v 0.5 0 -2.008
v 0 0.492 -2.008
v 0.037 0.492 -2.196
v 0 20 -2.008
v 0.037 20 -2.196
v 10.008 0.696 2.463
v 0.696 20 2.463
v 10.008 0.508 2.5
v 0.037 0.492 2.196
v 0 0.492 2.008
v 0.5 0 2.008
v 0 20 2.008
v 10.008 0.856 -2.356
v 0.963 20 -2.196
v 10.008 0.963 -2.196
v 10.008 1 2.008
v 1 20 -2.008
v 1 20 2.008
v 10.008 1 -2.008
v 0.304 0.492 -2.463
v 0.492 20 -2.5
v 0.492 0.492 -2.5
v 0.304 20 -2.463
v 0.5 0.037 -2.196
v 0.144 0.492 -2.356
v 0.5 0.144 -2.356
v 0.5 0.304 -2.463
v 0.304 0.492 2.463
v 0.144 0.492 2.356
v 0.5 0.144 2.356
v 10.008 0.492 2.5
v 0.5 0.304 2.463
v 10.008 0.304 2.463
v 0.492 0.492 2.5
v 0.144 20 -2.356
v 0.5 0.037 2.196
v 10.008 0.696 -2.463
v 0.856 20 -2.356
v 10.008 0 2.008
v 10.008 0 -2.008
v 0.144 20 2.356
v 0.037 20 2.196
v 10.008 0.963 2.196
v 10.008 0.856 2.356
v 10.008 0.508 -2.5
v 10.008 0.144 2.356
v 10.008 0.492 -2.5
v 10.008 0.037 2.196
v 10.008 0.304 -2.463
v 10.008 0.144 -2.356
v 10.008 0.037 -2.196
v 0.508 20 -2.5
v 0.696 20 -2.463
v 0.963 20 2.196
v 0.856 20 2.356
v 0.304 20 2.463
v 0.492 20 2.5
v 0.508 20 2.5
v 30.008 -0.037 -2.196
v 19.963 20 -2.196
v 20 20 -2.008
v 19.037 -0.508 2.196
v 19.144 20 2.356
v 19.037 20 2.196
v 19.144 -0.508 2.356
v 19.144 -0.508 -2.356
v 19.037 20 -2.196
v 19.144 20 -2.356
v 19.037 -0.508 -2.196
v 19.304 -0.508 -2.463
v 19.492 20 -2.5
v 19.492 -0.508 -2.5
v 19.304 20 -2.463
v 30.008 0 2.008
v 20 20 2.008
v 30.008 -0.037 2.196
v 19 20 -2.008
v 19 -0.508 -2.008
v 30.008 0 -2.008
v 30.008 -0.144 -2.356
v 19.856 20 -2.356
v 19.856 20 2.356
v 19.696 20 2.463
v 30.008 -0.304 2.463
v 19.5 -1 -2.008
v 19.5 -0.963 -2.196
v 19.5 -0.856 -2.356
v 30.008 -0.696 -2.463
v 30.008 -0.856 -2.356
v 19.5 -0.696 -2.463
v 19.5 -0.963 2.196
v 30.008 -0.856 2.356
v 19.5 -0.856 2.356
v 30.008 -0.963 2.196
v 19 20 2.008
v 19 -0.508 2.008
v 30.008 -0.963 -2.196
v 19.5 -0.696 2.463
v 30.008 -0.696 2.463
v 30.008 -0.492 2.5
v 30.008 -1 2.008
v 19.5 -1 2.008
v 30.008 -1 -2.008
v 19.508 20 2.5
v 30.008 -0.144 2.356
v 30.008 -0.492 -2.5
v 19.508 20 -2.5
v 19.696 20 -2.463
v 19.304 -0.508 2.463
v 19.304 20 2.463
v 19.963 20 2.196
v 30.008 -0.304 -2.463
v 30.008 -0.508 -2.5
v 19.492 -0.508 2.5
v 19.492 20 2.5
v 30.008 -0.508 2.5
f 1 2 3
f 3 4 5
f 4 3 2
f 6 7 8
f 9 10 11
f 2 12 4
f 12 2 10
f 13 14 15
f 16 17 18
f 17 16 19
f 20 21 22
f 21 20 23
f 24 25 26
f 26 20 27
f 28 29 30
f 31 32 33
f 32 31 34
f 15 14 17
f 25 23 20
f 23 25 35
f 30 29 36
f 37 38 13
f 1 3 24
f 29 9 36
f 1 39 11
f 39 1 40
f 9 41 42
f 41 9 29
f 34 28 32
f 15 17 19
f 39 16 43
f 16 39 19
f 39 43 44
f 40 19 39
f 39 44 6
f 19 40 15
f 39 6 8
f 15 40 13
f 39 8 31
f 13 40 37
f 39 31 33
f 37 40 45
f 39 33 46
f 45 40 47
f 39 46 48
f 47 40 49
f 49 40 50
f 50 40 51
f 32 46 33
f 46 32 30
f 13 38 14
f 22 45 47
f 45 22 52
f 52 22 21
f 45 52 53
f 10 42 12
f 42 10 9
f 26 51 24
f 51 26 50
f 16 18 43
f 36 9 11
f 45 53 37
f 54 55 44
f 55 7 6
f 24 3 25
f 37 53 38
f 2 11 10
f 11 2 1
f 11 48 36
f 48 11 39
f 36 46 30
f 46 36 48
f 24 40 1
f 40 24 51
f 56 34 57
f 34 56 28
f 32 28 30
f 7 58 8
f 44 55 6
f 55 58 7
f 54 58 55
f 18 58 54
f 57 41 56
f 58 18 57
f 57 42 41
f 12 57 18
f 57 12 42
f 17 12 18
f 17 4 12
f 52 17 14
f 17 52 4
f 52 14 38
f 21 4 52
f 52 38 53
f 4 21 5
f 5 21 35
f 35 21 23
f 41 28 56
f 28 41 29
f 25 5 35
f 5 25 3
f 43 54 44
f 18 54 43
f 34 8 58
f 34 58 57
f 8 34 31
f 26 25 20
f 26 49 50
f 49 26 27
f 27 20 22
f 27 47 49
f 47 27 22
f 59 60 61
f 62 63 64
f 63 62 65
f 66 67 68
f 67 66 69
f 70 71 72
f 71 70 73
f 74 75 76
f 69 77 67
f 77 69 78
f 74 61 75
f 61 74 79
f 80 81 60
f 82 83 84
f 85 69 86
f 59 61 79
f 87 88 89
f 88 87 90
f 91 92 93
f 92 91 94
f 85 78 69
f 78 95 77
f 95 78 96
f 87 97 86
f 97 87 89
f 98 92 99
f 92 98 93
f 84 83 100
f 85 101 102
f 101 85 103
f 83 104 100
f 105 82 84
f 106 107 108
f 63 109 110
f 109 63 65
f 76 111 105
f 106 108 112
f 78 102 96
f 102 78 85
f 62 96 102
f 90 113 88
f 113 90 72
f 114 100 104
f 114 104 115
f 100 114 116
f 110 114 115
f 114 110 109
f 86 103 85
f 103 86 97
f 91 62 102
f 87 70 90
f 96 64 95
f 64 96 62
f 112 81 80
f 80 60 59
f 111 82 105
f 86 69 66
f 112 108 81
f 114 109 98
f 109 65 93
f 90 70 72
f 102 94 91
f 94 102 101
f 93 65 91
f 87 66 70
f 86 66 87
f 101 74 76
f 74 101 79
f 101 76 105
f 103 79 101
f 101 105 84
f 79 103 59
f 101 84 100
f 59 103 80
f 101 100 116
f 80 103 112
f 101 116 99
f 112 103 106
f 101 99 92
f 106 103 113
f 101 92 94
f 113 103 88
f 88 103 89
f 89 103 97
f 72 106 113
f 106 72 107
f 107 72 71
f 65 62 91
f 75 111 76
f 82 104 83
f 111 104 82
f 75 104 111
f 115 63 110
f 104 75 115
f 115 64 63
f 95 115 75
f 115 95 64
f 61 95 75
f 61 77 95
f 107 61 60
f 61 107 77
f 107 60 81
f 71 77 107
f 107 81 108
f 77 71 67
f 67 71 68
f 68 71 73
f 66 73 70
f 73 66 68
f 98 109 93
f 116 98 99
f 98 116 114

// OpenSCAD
// file: ../utils/core/clip.scad
//
// NopSCADlib Copyright Chris Palmer 2018
// nop.head@gmail.com
// hydraraptor.blogspot.com
//
// This file is part of NopSCADlib.
//
// NopSCADlib is free software: you can redistribute it and/or modify it under the terms of the
// GNU General Public License as published by the Free Software Foundation, either version 3 of
// the License, or (at your option) any later version.
//
// NopSCADlib is distributed in the hope that it will be useful, but WITHOUT ANY WARRANTY;
// without even the implied warranty of MERCHANTABILITY or FITNESS FOR A PARTICULAR PURPOSE.
// See the GNU General Public License for more details.
//
// You should have received a copy of the GNU General Public License along with NopSCADlib.
// If not, see <https://www.gnu.org/licenses/>.
//

//
//! Construct arbitrarily large box to partition 3D space and clip objects, useful for creating cross sections to see the inside when debugging.
//!
//! Original version by Doug Moen on the OpenSCAD forum
//
//
module box(xmin, ymin, zmin, xmax, ymax, zmax) //! Construct a box given its bounds
    polyhedron(
        [[xmin, ymin, zmin],  // 0
         [xmin, ymin, zmax],  // 1
         [xmin, ymax, zmin],  // 2
         [xmin, ymax, zmax],  // 3
         [xmax, ymin, zmin],  // 4
         [xmax, ymin, zmax],  // 5
         [xmax, ymax, zmin],  // 6
         [xmax, ymax, zmax]], // 7
        [[7,5,1,3],  // top
         [2,0,4,6],  // bottom
         [5,4,0,1],  // front
         [3,2,6,7],  // back
         [5,7,6,4],  // right
         [0,2,3,1]]  // left
    );

module clip(xmin = -inf, ymin = -inf, zmin = -inf, xmax = inf, ymax = inf, zmax = inf) //! Clip child to specified boundaries
    render() intersection() {
        children();

        box(xmin, ymin, zmin, xmax, ymax, zmax);
    }
// file: ../utils/core/teardrops.scad
//
// NopSCADlib Copyright Chris Palmer 2018
// nop.head@gmail.com
// hydraraptor.blogspot.com
//
// This file is part of NopSCADlib.
//
// NopSCADlib is free software: you can redistribute it and/or modify it under the terms of the
// GNU General Public License as published by the Free Software Foundation, either version 3 of
// the License, or (at your option) any later version.
//
// NopSCADlib is distributed in the hope that it will be useful, but WITHOUT ANY WARRANTY;
// without even the implied warranty of MERCHANTABILITY or FITNESS FOR A PARTICULAR PURPOSE.
// See the GNU General Public License for more details.
//
// You should have received a copy of the GNU General Public License along with NopSCADlib.
// If not, see <https://www.gnu.org/licenses/>.
//

//
//! For making horizontal holes that don't need support material.
//! Small holes can get away without it, but they print better with truncated teardrops.
//!
//! Using teardrop_plus() or setting the plus option on other modules will elongate the teardrop vertically by the layer height, so when sliced the staircase tips
//! do not intrude into the circle. See <https://hydraraptor.blogspot.com/2020/07/horiholes_36.html>
//
module teardrop(h, r, center = true, truncate = true, chamfer = 0, plus = false) { //! For making horizontal holes that don't need support material, set ```truncate = false``` to make traditional RepRap teardrops that don't even need bridging
    module teardrop_2d(r, truncate)
        hull()
            for(y = plus ? [-1 : 1] : 0)
                translate([0, y * (layer_height / 2 - eps)]) {

                circle4n(r);

                if(truncate)
                    translate([0, r / 2])
                        square([2 * r * (sqrt(2) - 1), r], center = true);
                else
                    polygon([[0, 0], [eps, 0], [0, r * sqrt(2)]]);
            }

    render(convexity = 5)
        extrude_if(h, center)
            teardrop_2d(r, truncate);

    teardrop_chamfer(h, center, chamfer) {
        linear_extrude(eps, center = true)
            teardrop_2d(r + chamfer / 2, truncate);

        translate_z(-chamfer / 2)
            linear_extrude(eps, center = true)
                teardrop_2d(r, truncate);
    }
}

module semi_teardrop(h, r, d = undef, center = true, chamfer = 0, plus = false) { //! A semi teardrop in the positive Y domain
    module semi_teardrop_2d(r, d)
        intersection() {
            R = is_undef(d) ? r : d / 2;
            teardrop(r = R, h = 0, plus = plus);

            sq = R + 1;
            translate([-sq, 0])
                square([2 * sq, sq]);
        }

    render(convexity = 5)
        extrude_if(h, center)
            semi_teardrop_2d(r, d);

    teardrop_chamfer(h, center, chamfer) {
        linear_extrude(eps, center = true)
            semi_teardrop_2d(r + chamfer / 2, d);

        translate_z(-chamfer / 2)
            linear_extrude(eps, center = true)
                semi_teardrop_2d(r, d);
    }
}

module teardrop_plus(h, r, center = true, truncate = true, chamfer = 0) //! Slightly elongated teardrop to allow for the 3D printing staircase effect
    teardrop(h, r, center, truncate, chamfer, plus = true);

module tearslot(h, r, w, center = true, chamfer = 0, plus = false) { //! A horizontal slot that doesn't need support material
    module tearslot_2d(r, w)
        hull()
            for(x = [-1, 1])
                translate([x * w / 2, 0]) teardrop(r = r, h = 0, plus = plus);

    extrude_if(h, center)
        tearslot_2d(r, w);

    teardrop_chamfer(h, center, chamfer) {
        linear_extrude(eps, center = true)
            tearslot_2d(r + chamfer / 2, w);

        translate_z(-chamfer / 2)
            linear_extrude(eps, center = true)
                tearslot_2d(r, w);
    }
}

module vertical_tearslot(h, r, l, center = true, chamfer = 0, plus = false) { //! A vertical slot that doesn't need support material
    module vertical_tearslot_2d(r, l)
        hull()
            for(y = [-1, 1])
                translate([0,  y * l / 2])
                    teardrop(0, r, true, plus = plus);

    extrude_if(h, center)
        vertical_tearslot_2d(r, l);

    teardrop_chamfer(h, center, chamfer) {
        linear_extrude(eps, center = true)
            vertical_tearslot_2d(r + chamfer / 2, l);

        translate_z(-chamfer / 2)
            linear_extrude(eps, center = true)
                vertical_tearslot_2d(r, l);
    }
}

module teardrop_chamfer(h, center, chamfer) { //! Helper module for adding chamfer to a teardrop
    if(h && chamfer)
        translate_z(center ? 0 : h / 2)
            for(m = [0, 1])
                mirror([0, 0, m])
                    translate_z((h - eps ) / 2)
                        hull()
                            children();
}
// file: ../utils/core/polyholes.scad
//
// NopSCADlib Copyright Chris Palmer 2018
// nop.head@gmail.com
// hydraraptor.blogspot.com
//
// This file is part of NopSCADlib.
//
// NopSCADlib is free software: you can redistribute it and/or modify it under the terms of the
// GNU General Public License as published by the Free Software Foundation, either version 3 of
// the License, or (at your option) any later version.
//
// NopSCADlib is distributed in the hope that it will be useful, but WITHOUT ANY WARRANTY;
// without even the implied warranty of MERCHANTABILITY or FITNESS FOR A PARTICULAR PURPOSE.
// See the GNU General Public License for more details.
//
// You should have received a copy of the GNU General Public License along with NopSCADlib.
// If not, see <https://www.gnu.org/licenses/>.
//

//
//! A method of making 3D printed holes come out the right size regardless of the printer, providing
//! it gets the linear dimensions right. See <https://hydraraptor.blogspot.com/2011/02/polyholes.html>
//!
//! The module provides `poly_circle()`, `poly_cylinder()` and `poly_ring()` that is useful for making printed washers and pillars.
//!
//! `poly_cylinder()` has a `twist` parameter which can be set to make the polygon rotate each layer.
//! This can be used to mitigate the number of sides being small and make small holes stronger and more round, but is quite slow due to the
//! large increase in the number of facets.
//! When set to 1 the polygons alternate each layer, when set higher the rotation takes `twist + 1` layers to repeat.
//! A small additional rotation is added to make the polygon rotate one more side over the length of the hole to make it appear round when
//! viewed end on.
//!
//! When `twist` is set the resulting cylinder is extended by `eps` at each end so that the exact length of the hole can be used without
//! leaving a scar on either surface.
//
function sides(r, n = undef) = is_undef(n) ? max(round(4 * r), 3) : n ? max(n, 3) : r2sides(r); //! Optimum number of sides for specified radius
function corrected_radius(r, n = undef)   = r / cos(180 / sides(r, n));                         //! Adjusted radius to make flats lie on the circle
function corrected_diameter(d, n = undef) = 2 * corrected_radius(d / 2 , n);                    //! Adjusted diameter to make flats lie on the circle

module poly_circle(r, sides = undef) { //! Make a circle adjusted to print the correct size
    n = sides(r, sides);
    circle(r = corrected_radius(r, n), $fn = n);
}

module poly_cylinder(r, h, center = false, sides = undef, chamfer = false, twist = 0) {//! Make a cylinder adjusted to print the correct size
    if(twist) {
        slices = ceil(h / layer_height());
        twists = min(twist + 1, slices);
        sides = sides(r, sides);
        rot = 360 / sides / twists * (twists < slices ? (1 + 1 / slices) : 1);
        if(center)
            for(side = [0, 1])
                mirror([0, 0, side])
                    poly_cylinder(r = r, h = h / 2, sides = sides, twist = twist);
        else
            render(convexity = 5)
                for(i = [0 : slices - 1])
                    translate_z(i * layer_height() - eps)
                        rotate(rot * i)
                            poly_cylinder(r = r, h = layer_height() + 2 * eps, sides = sides);
    }
    else
        extrude_if(h, center)
            poly_circle(r, sides);

    if(h && chamfer)
        poly_cylinder(r + layer_height(), center ? layer_height() * 2 : layer_height(), center, sides = sides(r, sides));
}

module poly_ring(or, ir, sides = undef) { //! Make a 2D ring adjusted to have the correct internal radius
    cir = corrected_radius(ir, sides);
    filaments = (or - cir) / extrusion_width();
    if(filaments > 3 + eps)
        difference() {
            circle(or);

            poly_circle(ir, sides);
        }
    else
        if(filaments >= 2)
            difference() {
                offset(or - cir)
                    poly_circle(ir, sides);

                poly_circle(ir, sides);
            }
            else
                difference() {
                    poly_circle(or, sides);

                    offset(-squeezed_wall)
                        poly_circle(or, sides);
                }
}

module poly_tube(or, ir, h, center = false) //! Make a tube adjusted to have the correct internal radius
    extrude_if(h, center)
        poly_ring(or, ir);

module drill(r, h = 100, center = true) //! Make a cylinder for drilling holes suitable for CNC routing, set h = 0 for circle
    extrude_if(h, center)
        circle(r = corrected_radius(r, r2sides(r)));

module poly_drill(r, h = 100, center = true) //! Make a cylinder for drilling holes suitable for CNC routing if cnc_bit_r is non zero, otherwise a poly_cylinder.
    if(cnc_bit_r)
        drill(r, h, center = true);
    else
        poly_cylinder(r, h, center);

//
// Horizontal slot
//
module slot(r, l, h = 100) //! Make a horizontal slot suitable for CNC routing, set h = 0 for 2D version
    extrude_if(h)
        hull() {
            translate([l / 2,0])
                drill(r, 0);

            translate([-l / 2,0])
                drill(r, 0);
        }
// file: ../utils/core/bom.scad
//
// NopSCADlib Copyright Chris Palmer 2018
// nop.head@gmail.com
// hydraraptor.blogspot.com
//
// This file is part of NopSCADlib.
//
// NopSCADlib is free software: you can redistribute it and/or modify it under the terms of the
// GNU General Public License as published by the Free Software Foundation, either version 3 of
// the License, or (at your option) any later version.
//
// NopSCADlib is distributed in the hope that it will be useful, but WITHOUT ANY WARRANTY;
// without even the implied warranty of MERCHANTABILITY or FITNESS FOR A PARTICULAR PURPOSE.
// See the GNU General Public License for more details.
//
// You should have received a copy of the GNU General Public License along with NopSCADlib.
// If not, see <https://www.gnu.org/licenses/>.
//

//
//! Bill Of Materials generation via echo and the ```bom.py``` script. Also handles exploded assembly views and posing.
//! Assembly instructions can precede the module definition that makes the assembly.
//!
//! Assembly views shown in the instructions can be large or small and this is deduced by looking at the size of the printed parts involved and if any routed
//! parts are used.
//! This heuristic isn't always correct, so the default can be overridden by setting the ```big``` parameter of ```assembly``` to ```true``` or ```false```.
//!
//! The example below shows how to define a vitamin and incorporate it into an assembly with sub-assemblies and make an exploded view.
//! The resulting flat BOM is shown but heirachical BOMs are also generated for real projects.
//
function bom_mode(n = 1) = $_bom >= n && (is_undef($on_bom) || $on_bom);  //! Current BOM mode, 0 = none, 1 = printed and routed parts and assemblies, 2 includes vitamins as well
function exploded() = is_undef($exploded_parent) ? $exploded : 0;   //! Returns the value of ```$exploded``` if it is defined, else ```0```
function show_supports() = !$preview || exploded();                 //! True if printed support material should be shown

module no_explode() let($exploded_parent = true) children();        //! Prevent children being exploded
module no_pose() let($posed = true) children();                     //! Force children not to be posed even if parent is

module explode(d, explode_children = false, offset = [0,0,0]) {     //! Explode children by specified Z distance or vector ```d```, option to explode grand children
    v = is_list(d) ? d : [0, 0, d];
    o = is_list(offset) ? offset : [0, 0, offset];
    if($exploded && is_undef($exploded_parent) && norm(v)) {
        translate(o)                                                // Draw the line first in case the child is transparent
            color("yellow") hull() {
                sphere(0.2);

                translate(v * $exploded)
                    sphere(0.2);
            }

        translate(v * $exploded)
            let($exploded_parent = explode_children ? undef : true)
                children();
    }
    else
        children();
}

module pose(a = [55, 0, 25], t = [0, 0, 0], exploded = undef)       //! Pose an STL or assembly for rendering to png by specifying rotation ```a``` and translation ```t```, ```exploded = true for``` just the exploded view or ```false``` for unexploded only.
    if(is_undef($pose) || !is_undef($posed) || (!is_undef(exploded) && exploded != !!exploded()))
        children();
    else
        let($posed = true) // only pose the top level
            rotate([55, 0, 25])
                rotate([-a.x, 0, 0])
                    rotate([0, -a.y, 0])
                        rotate([0, 0, -a.z])
                            translate(-t)
                                children();

module pose_hflip(exploded = undef)       //! Pose an STL or assembly for rendering to png by flipping around the Y axis, ```exploded = true for``` just the exploded view or ```false``` for unexploded only.
    if(is_undef($pose) || !is_undef($posed) || (!is_undef(exploded) && exploded != !!exploded()))
        children();
    else
        let($posed = true) // only pose the top level
            hflip()
                children();

module pose_vflip(exploded = undef)       //! Pose an STL or assembly for rendering to png by flipping around the X axis, ```exploded = true for``` just the exploded view or ```false``` for unexploded only.
    if(is_undef($pose) || !is_undef($posed) || (!is_undef(exploded) && exploded != !!exploded()))
        children();
    else
        let($posed = true) // only pose the top level
            vflip()
                children();


module assembly(name, big = undef) {    //! Name an assembly that will appear on the BOM, there needs to a module named ```<name>_assembly``` to make it. ```big``` can force big or small assembly diagrams.
    if(bom_mode()) {
        args = is_undef(big) ? "" : str("(big=", big, ")");
        echo(str("~", name, "_assembly", args, "{"));
    }
    no_pose()
        if(is_undef($child_assembly))
            let($child_assembly = true)
                children();
        else
            no_explode()
                children();

    if(bom_mode())
        echo(str("~}", name, "_assembly"));
}

module stl_colour(colour = pp1_colour, alpha = 1) { //! Colour an stl where it is placed in an assembly. ```alpha``` can be used to make it appear transparent.
    $stl_colour = colour;
    color(colour, alpha)
        children();
}

module stl(name) {                      //! Name an stl that will appear on the BOM, there needs to a module named ```<name>_stl``` to make it
    if(bom_mode()) {
        colour = is_undef($stl_colour) ? pp1_colour : $stl_colour;
        echo(str("~", name, ".stl(colour='", colour, "')"));
    }
}

module dxf(name) {                      //! Name a dxf that will appear on the BOM, there needs to a module named ```<name>_dxf``` to make it
    if(bom_mode()) {
        if(is_undef($dxf_colour))
            echo(str("~", name, ".dxf"));
        else
            echo(str("~", name, ".dxf(colour='", $dxf_colour, "')"));
    }
}

function value_string(value) = is_string(value) ? str("\"", value, "\"") : str(value); //! Convert ```value``` to a string or quote it if it is already a string

function arg(value, default, name = "") =   //! Create string for arg if not default, helper for ```vitamin()```
    value == default ? ""
                     : name ? str(", ", name, " = ", value_string(value))
                            : str(", ", value_string(value));

module vitamin(description) {                //! Describe a vitamin for the BOM entry and precede it with a module call that creates it, eg. "wigit(42): Type 42 widget"
    if(bom_mode(2))
        echo(str("~", description, !is_undef($hidden) ? " - not shown" : ""));
}

module not_on_bom(on = false)               //! Specify the following child parts are not on the BOM, for example when they are on a PCB that comes assembled
    let($on_bom = on)
        children();

module hidden()                             //! Make item invisible, except on the BOM
    scale(1 / sqr(1024))
        let($hidden = true)
            children();
// file: ../utils/core/sphere.scad
//
// NopSCADlib Copyright Chris Palmer 2018
// nop.head@gmail.com
// hydraraptor.blogspot.com
//
// This file is part of NopSCADlib.
//
// NopSCADlib is free software: you can redistribute it and/or modify it under the terms of the
// GNU General Public License as published by the Free Software Foundation, either version 3 of
// the License, or (at your option) any later version.
//
// NopSCADlib is distributed in the hope that it will be useful, but WITHOUT ANY WARRANTY;
// without even the implied warranty of MERCHANTABILITY or FITNESS FOR A PARTICULAR PURPOSE.
// See the GNU General Public License for more details.
//
// You should have received a copy of the GNU General Public License along with NopSCADlib.
// If not, see <https://www.gnu.org/licenses/>.
//

//! Redefines `sphere()` to always have a vertex on all six half axes I.e. vertices at the poles and the equator and `$fn` a multiple of four.
//! This ensures `hull` and `minkowski` results have the correct dimensions when spheres are placed at the corners.

module sphere(r = 1, d = undef) {                   //! Override ```sphere``` so that has vertices on all three axes. Has the advantage of giving correct dimensions when hulled
    R = is_undef(d) ? r : d / 2;
    rotate_extrude($fn = r2sides4n(R))
        rotate(-90)
            semi_circle(R);
}
// file: ../utils/core/global.scad
//
// NopSCADlib Copyright Chris Palmer 2018
// nop.head@gmail.com
// hydraraptor.blogspot.com
//
// This file is part of NopSCADlib.
//
// NopSCADlib is free software: you can redistribute it and/or modify it under the terms of the
// GNU General Public License as published by the Free Software Foundation, either version 3 of
// the License, or (at your option) any later version.
//
// NopSCADlib is distributed in the hope that it will be useful, but WITHOUT ANY WARRANTY;
// without even the implied warranty of MERCHANTABILITY or FITNESS FOR A PARTICULAR PURPOSE.
// See the GNU General Public License for more details.
//
// You should have received a copy of the GNU General Public License along with NopSCADlib.
// If not, see <https://www.gnu.org/licenses/>.
//

//
//! Global constants, functions and modules. This file is used directly or indirectly in every scad file.
//! See [global_defs.scad](../../global_defs.scad) for a list of global constants.
//
include <../../global_defs.scad>

function inch(x) = x * 25.4;                                                        //! Inch to mm conversion (For fractional inches, 'inch(1 + 7/8)' will work as expected.)
function foot(x) = inch(x) * 12;                                                    //! Foot to mm conversion
function yard(x) = foot(x) * 3;                                                     //! Yard to mm conversion
function mm(x)   = x;                                                               //! Explicit mm specified
function cm(x)   = x * 10.0;                                                        //! cm to mm conversion
function m(x)    = cm(x) * 100.0;                                                   //! m to mm conversion

function sqr(x) = x * x;                                                            //! Returns the square of `x`
function echoit(x) = echo(x) x;                                                     //! Echo expression and return it, useful for debugging
function no_point(str) = chr([for(c = str(str)) if(c == ".") ord("p") else ord(c)]);//! Replace decimal point in string with 'p'
function in(list, x) = !!len([for(v = list) if(v == x) true]);                      //! Returns true if `x` is an element in the `list`
function Len(x) = is_list(x) ? len(x) : 0;                                          //! Returns the length of a list or 0 if `x` is not a list
function r2sides(r) = $fn ? $fn : ceil(max(min(360/ $fa, r * 2 * PI / $fs), 5));    //! Replicates the OpenSCAD logic to calculate the number of sides from the radius
function r2sides4n(r) = floor((r2sides(r) + 3) / 4) * 4;                            //! Round up the number of sides to a multiple of 4 to ensure points land on all axes
function limit(x, min, max) = max(min(x, max), min);                                //! Force x in range min <= x <= max

function round_to_layer(z) =  //! Round up to a layer boundary using `layer_height0` for the first layer and `layer_height` for subsequent layers.
    z <= 0 ? 0 :
    z <= layer_height0 ? layer_height0 :
    ceil((z -layer_height0) / layer_height) * layer_height + layer_height0;

function grey(n) = [0.01, 0.01, 0.01] * n;                                          //! Generate a shade of grey to pass to color().

module translate_z(z)                                                               //! Shortcut for Z only translations
    translate([0, 0, z]) children();

module vflip(flip=true)                                                             //! Invert children by doing a 180&deg; flip around the X axis
    rotate([flip ? 180 : 0, 0, 0]) children();

module hflip(flip=true)                                                             //! Invert children by doing a 180&deg; flip around the Y axis
    rotate([0, flip ? 180: 0, 0]) children();

module ellipse(xr, yr)                                                              //! Draw an ellipse
    scale([1, yr / xr]) circle4n(xr);

function slice_str(str, start, end, s ="") = start >= end ? s : slice_str(str, start + 1, end, str(s, str[start])); // Helper for slice()

function slice(list, start = 0, end = undef) = let( //! Slice a list or string with Python type semantics
        len = len(list),
        start = limit(start < 0 ? len + start : start, 0, len),
        end   = is_undef(end) ? len : limit(end   < 0 ? len + end : end, 0, len)
    ) is_string(list) ? slice_str(list, start, end) : [for(i = [start : 1 : end - 1]) list[i]];


module render_if(render = true, convexity = 2)      //! Renders an object if `render` is true, otherwise leaves it unrendered
    if (render)
        render(convexity = convexity)
            children();
    else
        children();

module render_manifold()                            //! Render if manifold to work around convexity bug in manifold
    render_if(manifold)
        children();

module extrude_if(h, center = true)                 //! Extrudes 2D object to 3D when `h` is nonzero, otherwise leaves it 2D
    if(h)
        linear_extrude(h, center = center, convexity = 5) // 3D
            children();
    else
        children();                                 // 2D

module circle4n(r, d = undef) {                     //! Circle with multiple of 4 vertices
    R = is_undef(d) ? r : d / 2;
    circle(R, $fn = r2sides4n(R));
}

module semi_circle(r, d = undef)                    //! A semi circle in the positive Y domain
    intersection() {
        R = is_undef(d) ? r : d / 2;
        circle4n(R);

        sq = R + 1;
        translate([-sq, 0])
            square([2 * sq, sq]);
    }

module right_triangle(width, height, h, center = true) //! A right angled triangle with the 90&deg; corner at the origin. 3D when `h` is nonzero, otherwise 2D
    extrude_if(h, center = center)
        polygon(points = [[0,0], [width, 0], [0, height]]);

include <sphere.scad>
include <bom.scad>
include <polyholes.scad>
include <teardrops.scad>
include <rounded_rectangle.scad>
include <clip.scad>
// file: ../utils/core/rounded_rectangle.scad
//
// NopSCADlib Copyright Chris Palmer 2018
// nop.head@gmail.com
// hydraraptor.blogspot.com
//
// This file is part of NopSCADlib.
//
// NopSCADlib is free software: you can redistribute it and/or modify it under the terms of the
// GNU General Public License as published by the Free Software Foundation, either version 3 of
// the License, or (at your option) any later version.
//
// NopSCADlib is distributed in the hope that it will be useful, but WITHOUT ANY WARRANTY;
// without even the implied warranty of MERCHANTABILITY or FITNESS FOR A PARTICULAR PURPOSE.
// See the GNU General Public License for more details.
//
// You should have received a copy of the GNU General Public License along with NopSCADlib.
// If not, see <https://www.gnu.org/licenses/>.
//

//
//! Rectangle with rounded corners.
//
module rounded_square(size, r, center = true) //! Like `square()` but with with rounded corners
{
    assert(r < min(size.x, size.y) / 2);
    $fn = r2sides4n(r);
    offset(r) offset(-r) square(size, center = center);
}

module rounded_rectangle(size, r, center = true, xy_center = true) //! Like `cube()` but corners rounded in XY plane and separate centre options for xy and z.
{
    extrude_if(size.z, center = center)
        rounded_square([size.x, size.y], r, xy_center);
}

module rounded_cube_xy(size, r = 0, xy_center = false, z_center = false) //! Like `cube()` but corners rounded in XY plane and separate centre options for xy and z.
{
    extrude_if(size.z, center = z_center)
        rounded_square([size.x, size.y], r, xy_center);
}

module rounded_cube_xz(size, r = 0, xy_center = false, z_center = false) //! Like `cube()` but corners rounded in XZ plane and separate centre options for xy and z.
{
    translate([xy_center ? 0 : size.x / 2, xy_center ? 0 : size.y / 2, z_center ? 0 : size.z / 2])
        rotate([90, 0, 0])
            rounded_cube_xy([size.x, size.z, size.y], r, xy_center = true, z_center = true);
}

module rounded_cube_yz(size, r = 0, xy_center = false, z_center = false) //! Like `cube()` but corners rounded in YX plane and separate centre options for xy and z.
{
    translate([xy_center ? 0 : size.x / 2, xy_center ? 0 : size.y / 2, z_center ? 0 : size.z / 2])
        rotate([90, 0, 90])
            rounded_cube_xy([size.y, size.z, size.x], r, xy_center = true, z_center = true);
}
// file: ../utils/core/core.scad
//
// NopSCADlib Copyright Chris Palmer 2018
// nop.head@gmail.com
// hydraraptor.blogspot.com
//
// This file is part of NopSCADlib.
//
// NopSCADlib is free software: you can redistribute it and/or modify it under the terms of the
// GNU General Public License as published by the Free Software Foundation, either version 3 of
// the License, or (at your option) any later version.
//
// NopSCADlib is distributed in the hope that it will be useful, but WITHOUT ANY WARRANTY;
// without even the implied warranty of MERCHANTABILITY or FITNESS FOR A PARTICULAR PURPOSE.
// See the GNU General Public License for more details.
//
// You should have received a copy of the GNU General Public License along with NopSCADlib.
// If not, see <https://www.gnu.org/licenses/>.
//

//
// Include this file to use the miniumum library
//
include <../../global_defs.scad>
//
// Global functions and modules
//
use <global.scad>

module use_stl(name) {               //! Import an STL to make a build platter
    stl(name);
    path = is_undef($target) ? "../stls/" : str("../", $target, "/stls/");
    import(str(path, name, ".stl"));
}

module use_dxf(name) {               //! Import a DXF to make a build panel
    dxf(name);
    path = is_undef($target) ? "../dxfs/" : str("../", $target, "/dxfs/");
    import(str(path, name, ".dxf"));
}
// file: ../utils/rounded_right_triangle.scad
//
// NopSCADlib Copyright Chris Palmer 2018
// nop.head@gmail.com
// hydraraptor.blogspot.com
//
// This file is part of NopSCADlib.
//
// NopSCADlib is free software: you can redistribute it and/or modify it under the terms of the
// GNU General Public License as published by the Free Software Foundation, either version 3 of
// the License, or (at your option) any later version.
//
// NopSCADlib is distributed in the hope that it will be useful, but WITHOUT ANY WARRANTY;
// without even the implied warranty of MERCHANTABILITY or FITNESS FOR A PARTICULAR PURPOSE.
// See the GNU General Public License for more details.
//
// You should have received a copy of the GNU General Public License along with NopSCADlib.
// If not, see <https://www.gnu.org/licenses/>.
//

//
//! Draw a 3D right triangle with rounded edges. Intended to be embedded in other parts. Can be optionally offset by the filleted amount.
//
include <../utils/core/core.scad>
include <..//utils/core/rounded_rectangle.scad>

module rounded_right_triangle(x, y, z, fillet, center = true, offset = false) { //! Draw a 3D right triangle with rounded edges.
    fillet = max(fillet, eps);
    size = [x + (offset ? 2 * fillet : 0), y + (offset ? 2 * fillet : 0), z];

    translate([offset ? -2 * fillet : 0, offset ? -2 * fillet : 0, center ? 0 : size.z / 2])
        hull() {
            translate([0, fillet, size.z / 2])
                rotate([90, 90, 0])
                    rounded_rectangle([size.z, 2 * fillet, eps], fillet - eps, center = false, xy_center = false);
            translate([0, size.y, size.z / 2])
                rotate([90, 90, 0])
                    rounded_rectangle([size.z, 2 * fillet, eps], fillet - eps, center = false, xy_center = false);
            translate([fillet, 0, size.z / 2])
                rotate([0, 90, 0])
                    rounded_rectangle([size.z, 2 * fillet, eps], fillet - eps, center = false, xy_center = false);
            translate([size.x, 0, size.z / 2])
                rotate([0, 90, 0])
                    rounded_rectangle([size.z, 2 * fillet, eps], fillet - eps, center = false, xy_center = false);
        }
}
// file: ../global_defs.scad
//
// NopSCADlib Copyright Chris Palmer 2018
// nop.head@gmail.com
// hydraraptor.blogspot.com
//
// This file is part of NopSCADlib.
//
// NopSCADlib is free software: you can redistribute it and/or modify it under the terms of the
// GNU General Public License as published by the Free Software Foundation, either version 3 of
// the License, or (at your option) any later version.
//
// NopSCADlib is distributed in the hope that it will be useful, but WITHOUT ANY WARRANTY;
// without even the implied warranty of MERCHANTABILITY or FITNESS FOR A PARTICULAR PURPOSE.
// See the GNU General Public License for more details.
//
// You should have received a copy of the GNU General Public License along with NopSCADlib.
// If not, see <https://www.gnu.org/licenses/>.
//

//
// This file included directly or indirectly in every scad file.
//
// This scheme allows the following:
//  bom defaults to 0
//  Setting $bom on the command line or in the main file before including lib.scad overrides it everywhere.
//  Setting $bom after including lib overrides bom in the libs but not in the local file.
//
rr_green = [0, 146/255, 0];                                               // RepRap logo colour
crimson  = [220/255, 20/255, 60/255];

function layer_height()
                = is_undef($layer_height)    ? 0.25   : $layer_height;    // layer height when printing
function extrusion_width()
                = is_undef($extrusion_width) ? 0.5    : $extrusion_width; // filament width when printing
nozzle          = is_undef($nozzle)          ? 0.45   : $nozzle;          // 3D printer nozzle
cnc_bit_r       = is_undef($cnc_bit_r)       ? 1.2    : $cnc_bit_r;       // minimum tool radius when milling 2D objects
pp1_colour      = is_undef($pp1_colour)      ? rr_green : $pp1_colour;    // printed part colour 1, RepRap logo colour
pp2_colour      = is_undef($pp2_colour)      ? crimson : $pp2_colour;     // printed part colour 2
pp3_colour      = is_undef($pp3_colour)      ? "SteelBlue" : $pp3_colour; // printed part colour 3
pp4_colour      = is_undef($pp4_colour)      ? "darkorange" : $pp4_colour;// printed part colour 4
show_rays       = is_undef($show_rays)       ? false  : $show_rays;       // show camera sight lines and light direction
show_threads    = is_undef($show_threads)    ? false  : $show_threads;    // show screw threads

// Minimum wall is about two filaments wide but we extrude it closer to get better bonding
squeezed_wall = $preview ? 2 * extrusion_width() - layer_height() * (1 - PI / 4)
                         : extrusion_width() - layer_height() / 2 + nozzle / 2 + extrusion_width() / 2;

inf = 1e10;      // very big
eps = 1/128;     // small fudge factor to stop CSG barfing on coincident faces.
$fa = 6;
$fs = extrusion_width() / 2;

function round_to_layer(z) = ceil(z / layer_height()) * layer_height();
// Some additional named colours
function grey(n) = [0.01, 0.01, 0.01] * n;                                          //! Generate a shade of grey to pass to color().
silver                          = [0.75, 0.75, 0.75];
gold                            = [255, 215,   0] / 255;
brass                           = [255, 220, 100] / 255;
copper                          = [230, 140,  51] / 255;

/*
 * Enums
 */
//
// Screws
//
hs_cap    = 0;
hs_pan    = 1;
hs_cs     = 2;     // counter sunk
hs_hex    = 3;
hs_grub   = 4;     // pulley set screw
hs_cs_cap = 5;
hs_dome   = 6;
//
// Hot end descriptions
//
jhead   = 1;
e3d     = 2;
//
// Face enumeration
//
f_bottom = 0;
f_top    = 1;
f_left   = 2;
f_right  = 3;
f_front  = 4;
f_back   = 5;
// main file
//
// NopSCADlib Copyright Chris Palmer 2018
// nop.head@gmail.com
// hydraraptor.blogspot.com
//
// This file is part of NopSCADlib.
//
// NopSCADlib is free software: you can redistribute it and/or modify it under the terms of the
// GNU General Public License as published by the Free Software Foundation, either version 3 of
// the License, or (at your option) any later version.
//
// NopSCADlib is distributed in the hope that it will be useful, but WITHOUT ANY WARRANTY;
// without even the implied warranty of MERCHANTABILITY or FITNESS FOR A PARTICULAR PURPOSE.
// See the GNU General Public License for more details.
//
// You should have received a copy of the GNU General Public License along with NopSCADlib.
// If not, see <https://www.gnu.org/licenses/>.
//

include <../global_defs.scad>
use <../utils/rounded_right_triangle.scad>


module rounded_right_triangles() {
    rounded_right_triangle(10, 20, 5, 0.5);

    translate([20, 0])
        rounded_right_triangle(10, 20, 5, 0.5, offset = true);
}

rounded_right_triangles();
